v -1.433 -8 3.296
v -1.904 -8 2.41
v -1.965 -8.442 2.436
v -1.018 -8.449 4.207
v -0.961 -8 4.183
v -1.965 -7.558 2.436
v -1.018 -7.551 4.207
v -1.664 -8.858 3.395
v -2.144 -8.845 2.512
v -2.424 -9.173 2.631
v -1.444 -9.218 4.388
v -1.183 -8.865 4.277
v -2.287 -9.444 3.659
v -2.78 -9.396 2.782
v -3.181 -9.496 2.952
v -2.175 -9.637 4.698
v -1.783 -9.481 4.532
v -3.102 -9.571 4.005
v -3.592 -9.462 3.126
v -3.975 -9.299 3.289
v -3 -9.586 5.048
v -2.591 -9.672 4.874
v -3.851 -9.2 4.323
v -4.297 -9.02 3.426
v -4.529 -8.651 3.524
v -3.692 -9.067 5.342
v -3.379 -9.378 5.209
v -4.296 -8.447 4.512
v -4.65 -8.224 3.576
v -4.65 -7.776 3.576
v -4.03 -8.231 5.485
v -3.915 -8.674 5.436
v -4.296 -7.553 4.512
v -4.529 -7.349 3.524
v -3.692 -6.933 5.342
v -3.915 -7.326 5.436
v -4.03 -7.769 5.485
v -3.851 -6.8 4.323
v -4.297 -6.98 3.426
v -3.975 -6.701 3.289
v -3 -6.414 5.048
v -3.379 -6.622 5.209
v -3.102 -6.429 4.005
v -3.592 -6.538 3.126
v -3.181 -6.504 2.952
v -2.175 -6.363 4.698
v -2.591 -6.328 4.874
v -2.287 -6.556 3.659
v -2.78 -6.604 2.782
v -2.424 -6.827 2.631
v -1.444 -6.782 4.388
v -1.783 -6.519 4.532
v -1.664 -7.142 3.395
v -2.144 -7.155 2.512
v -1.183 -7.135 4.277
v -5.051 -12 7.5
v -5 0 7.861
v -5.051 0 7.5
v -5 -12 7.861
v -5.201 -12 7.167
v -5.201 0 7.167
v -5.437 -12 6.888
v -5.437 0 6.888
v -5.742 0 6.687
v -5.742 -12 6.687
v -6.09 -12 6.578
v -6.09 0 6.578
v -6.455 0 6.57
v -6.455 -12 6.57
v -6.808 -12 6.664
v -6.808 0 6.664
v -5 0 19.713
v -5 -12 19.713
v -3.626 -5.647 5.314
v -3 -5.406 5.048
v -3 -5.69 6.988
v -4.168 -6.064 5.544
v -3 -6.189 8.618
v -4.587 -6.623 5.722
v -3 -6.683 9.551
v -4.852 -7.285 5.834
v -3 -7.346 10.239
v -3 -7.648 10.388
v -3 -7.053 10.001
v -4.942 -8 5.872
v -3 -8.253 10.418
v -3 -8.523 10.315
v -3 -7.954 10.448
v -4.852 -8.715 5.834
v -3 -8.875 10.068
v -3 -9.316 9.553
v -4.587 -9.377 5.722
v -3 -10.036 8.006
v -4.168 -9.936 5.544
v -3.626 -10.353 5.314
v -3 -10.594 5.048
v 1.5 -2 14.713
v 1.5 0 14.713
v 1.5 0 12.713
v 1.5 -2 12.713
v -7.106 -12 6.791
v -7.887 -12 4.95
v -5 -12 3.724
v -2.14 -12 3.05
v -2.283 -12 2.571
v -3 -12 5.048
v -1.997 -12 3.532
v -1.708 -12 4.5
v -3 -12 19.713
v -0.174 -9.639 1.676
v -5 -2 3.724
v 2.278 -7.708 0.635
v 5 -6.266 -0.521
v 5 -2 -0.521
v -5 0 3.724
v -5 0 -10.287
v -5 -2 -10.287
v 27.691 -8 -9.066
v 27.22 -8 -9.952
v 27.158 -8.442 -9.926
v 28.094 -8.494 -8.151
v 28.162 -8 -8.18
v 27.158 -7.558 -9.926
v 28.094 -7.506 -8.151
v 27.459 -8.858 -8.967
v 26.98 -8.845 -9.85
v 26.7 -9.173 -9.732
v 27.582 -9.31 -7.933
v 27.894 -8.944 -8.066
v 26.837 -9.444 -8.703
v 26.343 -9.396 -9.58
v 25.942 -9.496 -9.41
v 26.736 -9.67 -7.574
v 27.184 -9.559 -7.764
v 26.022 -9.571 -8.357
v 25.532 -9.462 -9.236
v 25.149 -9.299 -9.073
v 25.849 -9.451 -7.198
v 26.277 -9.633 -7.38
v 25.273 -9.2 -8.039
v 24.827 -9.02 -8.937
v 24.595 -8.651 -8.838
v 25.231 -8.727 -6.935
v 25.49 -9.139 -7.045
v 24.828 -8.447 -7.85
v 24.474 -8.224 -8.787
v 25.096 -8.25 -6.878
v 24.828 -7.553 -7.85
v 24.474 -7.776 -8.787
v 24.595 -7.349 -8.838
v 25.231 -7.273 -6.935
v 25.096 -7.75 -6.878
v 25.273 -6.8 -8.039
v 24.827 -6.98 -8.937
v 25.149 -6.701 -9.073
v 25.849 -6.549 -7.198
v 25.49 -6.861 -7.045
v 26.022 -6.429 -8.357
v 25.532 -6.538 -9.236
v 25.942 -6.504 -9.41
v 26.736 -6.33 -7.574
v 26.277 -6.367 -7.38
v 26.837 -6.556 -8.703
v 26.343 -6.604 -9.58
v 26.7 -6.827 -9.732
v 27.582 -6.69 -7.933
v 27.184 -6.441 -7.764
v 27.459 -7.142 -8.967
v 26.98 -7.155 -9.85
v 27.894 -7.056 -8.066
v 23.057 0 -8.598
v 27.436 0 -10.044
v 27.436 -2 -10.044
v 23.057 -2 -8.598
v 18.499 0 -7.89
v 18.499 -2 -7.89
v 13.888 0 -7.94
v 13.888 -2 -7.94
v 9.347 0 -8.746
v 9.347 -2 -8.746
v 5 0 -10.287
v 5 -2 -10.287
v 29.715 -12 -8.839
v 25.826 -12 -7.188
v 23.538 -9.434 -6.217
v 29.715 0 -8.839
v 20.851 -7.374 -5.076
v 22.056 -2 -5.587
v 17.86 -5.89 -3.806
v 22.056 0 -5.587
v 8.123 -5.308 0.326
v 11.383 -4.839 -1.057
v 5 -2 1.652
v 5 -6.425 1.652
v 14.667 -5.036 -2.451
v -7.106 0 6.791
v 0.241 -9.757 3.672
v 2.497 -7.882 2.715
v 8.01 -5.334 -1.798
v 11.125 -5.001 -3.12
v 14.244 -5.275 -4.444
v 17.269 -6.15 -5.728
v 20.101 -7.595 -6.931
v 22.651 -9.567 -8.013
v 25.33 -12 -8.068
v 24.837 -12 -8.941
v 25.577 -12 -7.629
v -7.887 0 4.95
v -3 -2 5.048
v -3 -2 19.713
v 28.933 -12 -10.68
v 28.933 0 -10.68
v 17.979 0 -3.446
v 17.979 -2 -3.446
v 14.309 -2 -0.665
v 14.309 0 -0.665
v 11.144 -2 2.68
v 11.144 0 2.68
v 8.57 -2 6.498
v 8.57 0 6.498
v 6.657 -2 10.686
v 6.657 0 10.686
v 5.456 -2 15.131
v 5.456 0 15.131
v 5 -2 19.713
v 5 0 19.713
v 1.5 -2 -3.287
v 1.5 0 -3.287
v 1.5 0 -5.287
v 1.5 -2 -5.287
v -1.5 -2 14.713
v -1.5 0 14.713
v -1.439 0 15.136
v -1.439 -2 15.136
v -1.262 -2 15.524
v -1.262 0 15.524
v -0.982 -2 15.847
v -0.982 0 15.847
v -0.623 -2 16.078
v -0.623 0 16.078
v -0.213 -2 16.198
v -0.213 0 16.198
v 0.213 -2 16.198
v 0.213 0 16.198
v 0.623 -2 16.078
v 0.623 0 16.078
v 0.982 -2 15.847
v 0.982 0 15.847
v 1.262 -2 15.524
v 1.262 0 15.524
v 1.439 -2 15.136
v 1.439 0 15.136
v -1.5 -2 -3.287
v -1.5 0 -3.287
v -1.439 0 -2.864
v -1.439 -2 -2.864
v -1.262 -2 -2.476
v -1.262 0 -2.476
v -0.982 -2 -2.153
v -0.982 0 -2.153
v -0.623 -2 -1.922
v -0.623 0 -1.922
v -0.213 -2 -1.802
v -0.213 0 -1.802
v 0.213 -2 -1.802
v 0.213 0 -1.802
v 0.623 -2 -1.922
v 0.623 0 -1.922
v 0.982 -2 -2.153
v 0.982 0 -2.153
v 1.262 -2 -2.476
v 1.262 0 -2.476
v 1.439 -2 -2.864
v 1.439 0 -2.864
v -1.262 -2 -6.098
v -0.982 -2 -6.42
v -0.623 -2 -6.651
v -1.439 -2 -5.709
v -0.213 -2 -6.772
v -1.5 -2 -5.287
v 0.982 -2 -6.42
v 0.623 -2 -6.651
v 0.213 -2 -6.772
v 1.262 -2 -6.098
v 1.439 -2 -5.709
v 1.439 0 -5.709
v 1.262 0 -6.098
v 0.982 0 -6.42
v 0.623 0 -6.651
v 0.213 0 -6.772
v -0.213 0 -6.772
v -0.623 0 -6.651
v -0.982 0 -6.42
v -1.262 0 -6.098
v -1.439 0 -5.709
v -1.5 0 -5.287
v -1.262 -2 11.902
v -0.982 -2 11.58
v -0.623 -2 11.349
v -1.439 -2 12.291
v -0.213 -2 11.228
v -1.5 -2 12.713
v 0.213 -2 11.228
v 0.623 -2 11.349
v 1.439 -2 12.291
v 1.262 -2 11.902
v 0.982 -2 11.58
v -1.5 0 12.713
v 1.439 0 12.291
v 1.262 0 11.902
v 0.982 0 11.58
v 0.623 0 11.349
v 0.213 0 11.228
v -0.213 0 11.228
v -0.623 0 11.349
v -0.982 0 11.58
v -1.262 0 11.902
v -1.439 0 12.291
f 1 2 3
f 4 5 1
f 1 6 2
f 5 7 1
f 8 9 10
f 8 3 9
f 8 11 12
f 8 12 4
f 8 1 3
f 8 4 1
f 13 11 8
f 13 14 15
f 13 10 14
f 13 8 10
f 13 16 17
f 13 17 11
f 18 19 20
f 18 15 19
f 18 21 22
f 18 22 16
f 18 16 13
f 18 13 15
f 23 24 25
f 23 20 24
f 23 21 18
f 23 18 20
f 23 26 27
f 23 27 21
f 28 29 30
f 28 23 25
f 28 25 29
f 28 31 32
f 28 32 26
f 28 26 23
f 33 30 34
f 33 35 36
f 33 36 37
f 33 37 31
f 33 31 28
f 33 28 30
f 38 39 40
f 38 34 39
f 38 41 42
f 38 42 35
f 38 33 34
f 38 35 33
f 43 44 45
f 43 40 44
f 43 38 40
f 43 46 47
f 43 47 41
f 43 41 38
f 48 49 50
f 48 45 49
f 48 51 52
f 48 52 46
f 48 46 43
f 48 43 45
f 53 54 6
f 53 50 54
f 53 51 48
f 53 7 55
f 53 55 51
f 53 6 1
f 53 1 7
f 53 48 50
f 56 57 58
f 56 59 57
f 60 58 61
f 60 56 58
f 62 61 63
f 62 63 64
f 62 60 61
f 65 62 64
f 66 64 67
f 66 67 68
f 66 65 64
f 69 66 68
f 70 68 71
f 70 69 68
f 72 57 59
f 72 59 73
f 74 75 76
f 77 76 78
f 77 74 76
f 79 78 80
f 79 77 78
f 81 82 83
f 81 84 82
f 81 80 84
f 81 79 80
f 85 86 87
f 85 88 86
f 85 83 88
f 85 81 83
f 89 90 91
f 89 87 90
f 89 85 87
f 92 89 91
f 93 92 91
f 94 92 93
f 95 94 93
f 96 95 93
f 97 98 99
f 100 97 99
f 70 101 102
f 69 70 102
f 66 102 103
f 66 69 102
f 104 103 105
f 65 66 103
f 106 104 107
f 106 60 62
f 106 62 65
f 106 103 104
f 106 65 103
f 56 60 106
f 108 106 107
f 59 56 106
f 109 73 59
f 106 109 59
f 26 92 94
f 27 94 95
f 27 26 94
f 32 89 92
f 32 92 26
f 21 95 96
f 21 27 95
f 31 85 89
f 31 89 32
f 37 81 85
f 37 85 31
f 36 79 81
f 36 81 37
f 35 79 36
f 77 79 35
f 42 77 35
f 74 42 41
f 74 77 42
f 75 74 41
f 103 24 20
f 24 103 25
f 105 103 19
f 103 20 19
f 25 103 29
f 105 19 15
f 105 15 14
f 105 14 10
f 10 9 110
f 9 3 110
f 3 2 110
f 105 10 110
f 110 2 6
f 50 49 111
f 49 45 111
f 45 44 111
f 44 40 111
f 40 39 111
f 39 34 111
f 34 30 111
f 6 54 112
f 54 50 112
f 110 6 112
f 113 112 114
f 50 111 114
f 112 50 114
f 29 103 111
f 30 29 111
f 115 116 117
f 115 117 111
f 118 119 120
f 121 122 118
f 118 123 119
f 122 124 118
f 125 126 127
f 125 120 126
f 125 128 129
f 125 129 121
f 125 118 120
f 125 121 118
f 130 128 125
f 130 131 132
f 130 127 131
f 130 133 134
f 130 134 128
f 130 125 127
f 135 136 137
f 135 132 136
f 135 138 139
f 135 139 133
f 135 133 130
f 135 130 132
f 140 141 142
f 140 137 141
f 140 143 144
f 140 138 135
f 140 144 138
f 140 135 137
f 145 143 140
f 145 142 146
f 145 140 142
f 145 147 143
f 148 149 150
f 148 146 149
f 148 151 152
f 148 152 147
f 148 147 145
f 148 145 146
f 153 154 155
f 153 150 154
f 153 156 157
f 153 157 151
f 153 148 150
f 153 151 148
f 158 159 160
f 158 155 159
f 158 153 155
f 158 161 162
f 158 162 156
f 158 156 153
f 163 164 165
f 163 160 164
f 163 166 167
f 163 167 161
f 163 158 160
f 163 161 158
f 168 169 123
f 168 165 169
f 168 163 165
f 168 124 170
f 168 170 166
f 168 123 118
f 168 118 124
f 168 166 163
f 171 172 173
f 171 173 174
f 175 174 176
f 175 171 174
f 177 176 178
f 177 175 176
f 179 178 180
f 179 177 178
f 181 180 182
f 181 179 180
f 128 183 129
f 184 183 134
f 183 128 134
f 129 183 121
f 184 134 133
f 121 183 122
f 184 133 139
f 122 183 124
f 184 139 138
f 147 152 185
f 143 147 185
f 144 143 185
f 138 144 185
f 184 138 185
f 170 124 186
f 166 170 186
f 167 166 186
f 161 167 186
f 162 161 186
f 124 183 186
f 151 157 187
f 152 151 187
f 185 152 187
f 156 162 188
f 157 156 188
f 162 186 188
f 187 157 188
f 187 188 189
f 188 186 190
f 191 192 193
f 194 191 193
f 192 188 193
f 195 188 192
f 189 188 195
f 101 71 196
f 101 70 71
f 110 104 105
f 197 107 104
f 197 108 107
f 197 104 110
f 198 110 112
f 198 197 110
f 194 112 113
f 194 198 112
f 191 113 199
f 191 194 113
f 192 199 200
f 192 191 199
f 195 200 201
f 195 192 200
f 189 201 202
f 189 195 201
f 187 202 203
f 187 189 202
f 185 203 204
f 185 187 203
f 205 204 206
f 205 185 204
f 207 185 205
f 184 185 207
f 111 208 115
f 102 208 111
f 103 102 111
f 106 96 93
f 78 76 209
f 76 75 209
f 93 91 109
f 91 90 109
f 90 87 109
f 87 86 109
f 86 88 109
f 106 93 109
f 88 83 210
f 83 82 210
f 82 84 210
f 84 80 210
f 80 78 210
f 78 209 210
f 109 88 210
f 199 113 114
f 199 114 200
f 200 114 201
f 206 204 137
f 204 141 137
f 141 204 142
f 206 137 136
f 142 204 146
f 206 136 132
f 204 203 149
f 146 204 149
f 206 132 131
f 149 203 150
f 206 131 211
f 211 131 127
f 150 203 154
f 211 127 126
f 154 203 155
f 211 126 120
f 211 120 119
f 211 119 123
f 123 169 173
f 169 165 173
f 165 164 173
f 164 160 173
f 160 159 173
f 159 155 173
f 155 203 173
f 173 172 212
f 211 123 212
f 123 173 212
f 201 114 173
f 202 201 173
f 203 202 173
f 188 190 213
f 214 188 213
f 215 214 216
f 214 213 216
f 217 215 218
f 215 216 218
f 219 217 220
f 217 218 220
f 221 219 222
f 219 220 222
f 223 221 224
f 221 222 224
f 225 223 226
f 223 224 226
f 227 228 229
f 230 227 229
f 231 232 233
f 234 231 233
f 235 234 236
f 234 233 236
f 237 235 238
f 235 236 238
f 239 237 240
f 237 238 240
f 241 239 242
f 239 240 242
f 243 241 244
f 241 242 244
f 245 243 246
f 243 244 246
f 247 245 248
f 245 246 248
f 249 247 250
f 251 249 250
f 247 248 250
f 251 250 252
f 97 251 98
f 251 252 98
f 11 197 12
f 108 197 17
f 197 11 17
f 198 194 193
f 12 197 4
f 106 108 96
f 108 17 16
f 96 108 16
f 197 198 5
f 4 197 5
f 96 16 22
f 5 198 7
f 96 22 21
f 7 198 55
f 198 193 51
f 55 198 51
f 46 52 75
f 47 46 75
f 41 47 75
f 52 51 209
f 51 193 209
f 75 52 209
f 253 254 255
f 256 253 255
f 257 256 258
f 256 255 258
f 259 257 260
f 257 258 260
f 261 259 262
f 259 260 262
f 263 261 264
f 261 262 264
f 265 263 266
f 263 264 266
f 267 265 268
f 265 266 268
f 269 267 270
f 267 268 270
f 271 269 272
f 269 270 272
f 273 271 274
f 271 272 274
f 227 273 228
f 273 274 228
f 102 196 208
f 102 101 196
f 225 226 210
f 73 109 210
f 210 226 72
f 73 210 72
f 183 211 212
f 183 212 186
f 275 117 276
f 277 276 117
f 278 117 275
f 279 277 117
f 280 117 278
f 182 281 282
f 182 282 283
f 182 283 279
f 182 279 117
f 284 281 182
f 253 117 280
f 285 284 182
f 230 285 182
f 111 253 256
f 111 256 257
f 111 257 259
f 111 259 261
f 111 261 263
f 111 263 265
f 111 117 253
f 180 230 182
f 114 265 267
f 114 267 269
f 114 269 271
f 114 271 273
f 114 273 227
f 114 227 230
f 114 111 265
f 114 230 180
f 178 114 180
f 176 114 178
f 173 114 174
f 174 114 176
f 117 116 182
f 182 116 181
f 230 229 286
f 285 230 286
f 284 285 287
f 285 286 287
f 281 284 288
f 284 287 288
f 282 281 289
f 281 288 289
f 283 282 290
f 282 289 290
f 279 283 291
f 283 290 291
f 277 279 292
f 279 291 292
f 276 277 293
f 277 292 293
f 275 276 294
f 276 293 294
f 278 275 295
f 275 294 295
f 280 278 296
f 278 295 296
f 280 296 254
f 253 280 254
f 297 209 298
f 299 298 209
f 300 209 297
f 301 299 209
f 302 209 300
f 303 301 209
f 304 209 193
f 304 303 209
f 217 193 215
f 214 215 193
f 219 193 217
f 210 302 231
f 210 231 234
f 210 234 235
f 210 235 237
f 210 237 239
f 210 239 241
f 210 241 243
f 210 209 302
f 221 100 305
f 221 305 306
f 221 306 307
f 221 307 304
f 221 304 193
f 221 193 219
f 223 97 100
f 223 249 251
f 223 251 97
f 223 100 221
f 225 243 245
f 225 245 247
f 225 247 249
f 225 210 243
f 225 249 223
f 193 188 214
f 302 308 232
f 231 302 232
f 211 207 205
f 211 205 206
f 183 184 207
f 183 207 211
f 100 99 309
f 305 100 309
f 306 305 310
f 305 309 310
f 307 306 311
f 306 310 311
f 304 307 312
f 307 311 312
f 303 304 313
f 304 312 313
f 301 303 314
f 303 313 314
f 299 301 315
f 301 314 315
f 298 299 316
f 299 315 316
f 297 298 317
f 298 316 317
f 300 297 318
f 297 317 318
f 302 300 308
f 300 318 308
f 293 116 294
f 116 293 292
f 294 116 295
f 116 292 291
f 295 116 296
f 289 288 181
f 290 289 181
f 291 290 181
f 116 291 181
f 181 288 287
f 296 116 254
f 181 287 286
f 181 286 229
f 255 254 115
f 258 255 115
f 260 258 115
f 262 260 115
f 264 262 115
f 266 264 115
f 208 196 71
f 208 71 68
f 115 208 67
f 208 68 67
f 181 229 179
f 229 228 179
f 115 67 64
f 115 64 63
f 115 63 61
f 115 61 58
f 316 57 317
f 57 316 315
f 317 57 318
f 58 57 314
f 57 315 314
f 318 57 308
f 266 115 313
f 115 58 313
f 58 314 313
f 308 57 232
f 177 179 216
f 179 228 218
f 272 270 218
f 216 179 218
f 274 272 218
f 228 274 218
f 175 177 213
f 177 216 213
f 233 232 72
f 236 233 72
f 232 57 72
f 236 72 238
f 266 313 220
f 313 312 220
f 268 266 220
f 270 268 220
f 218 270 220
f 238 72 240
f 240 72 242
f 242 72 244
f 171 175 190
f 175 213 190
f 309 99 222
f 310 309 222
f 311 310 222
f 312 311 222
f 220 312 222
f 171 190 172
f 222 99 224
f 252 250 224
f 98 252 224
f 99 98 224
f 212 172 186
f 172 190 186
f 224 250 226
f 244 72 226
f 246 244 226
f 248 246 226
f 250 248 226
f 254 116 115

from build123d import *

# Parameters (mm, degrees)
F0_W          = 10
F0_H          = 30
F1_DEPTH      = 2
F3_DEPTH      = 10
F3_DEPTH_BACK = 2
F4_R          = 1.5
F4_R_2        = 19
F5_DEPTH      = 28.2830263058
F5_TAPER      = -5
F6_R          = 2.65
F7_DEPTH      = 55
F8_T1_DEPTH   = 2


# Not quite as in the source:
# - a fillet or chamfer that OpenCascade refuses, or shapes differently, is made with other operations: its cross-section is extruded or revolved along the edge and cut away or added
# - an extrude ends at something that could not be found from the text; its depth is read off the source's solid
# - a feature names something its author has since deleted; it is built from what else it names


with BuildPart() as f1:
    # F0 (on Front) → F1 (new body)
    with BuildSketch(Plane.XZ):
        with Locations((0, 4.7131987304)):
            Rectangle(F0_W, F0_H)
        with BuildLine():
            ThreePointArc((-1.5, -3.2868012696), (0, -1.7868012696), (1.5, -3.2868012696))
            Line((1.5, -3.2868012696), (1.5, -5.2868012696))
            ThreePointArc((1.5, -5.2868012696), (0, -6.7868012696), (-1.5, -5.2868012696))
            Line((-1.5, -5.2868012696), (-1.5, -3.2868012696))
        make_face(mode=Mode.SUBTRACT)
        with BuildLine():
            ThreePointArc((-1.5, 14.7131987304), (0, 16.2131987304), (1.5, 14.7131987304))
            Line((1.5, 14.7131987304), (1.5, 12.7131987304))
            ThreePointArc((1.5, 12.7131987304), (0, 11.2131987304), (-1.5, 12.7131987304))
            Line((-1.5, 12.7131987304), (-1.5, 14.7131987304))
        make_face(mode=Mode.SUBTRACT)
    extrude(amount=F1_DEPTH)

    # F2 (on face) → F3 (join, two sides)
    with BuildSketch(Plane.XZ.offset(2)) as f3_sk:
        with BuildLine():
            Line((-7.8870679483, 4.9496821465), (-5, 3.7241945098))
            Line((-5, 3.7241945098), (-5, 7.8610010163))
            ThreePointArc((-5, 7.8610010163), (-5.5824819191, 6.7769494476), (-6.807950467, 6.6643447068))
            Line((-6.807950467, 6.6643447068), (-7.1056056914, 6.7906918534))
            Line((-7.1056056914, 6.7906918534), (-7.8870679483, 4.9496821465))
        make_face()
        Polygon((5, -0.5205536523), (28.9331261898, -10.679562993), (29.7145884467, -8.8385532861), (5, 1.6521671025), align=None)
        Polygon((-5, 3.7241945098), (5, -0.5205536523), (5, 1.6521671025), (-3, 5.0479656322), (-3, 19.7131987304), (-5, 19.7131987304), (-5, 7.8610010163), align=None)
    extrude(amount=F3_DEPTH)
    extrude(f3_sk.sketch, amount=-F3_DEPTH_BACK)

    # F4 (on face) → F5 (cut, through all)
    with BuildSketch(Plane(origin=(0.5761265937, 0, 1.3572691988), x_dir=(0.9205048535, 0, -0.3907311285), z_dir=(-0.3907311285, 0, -0.9205048535))):
        with Locations((-4.1940792167, 8)):
            Circle(F4_R)
        with Locations((27.4445048224, 8)):
            Circle(F4_R)
        with Locations((11.6252128028, 24)):
            Circle(F4_R_2)
    extrude(amount=-F5_DEPTH, taper=F5_TAPER, mode=Mode.SUBTRACT)

    # F6 (on face) → F7 (cut, through all)
    with BuildSketch(Plane(origin=(1.3575888507, 0, 3.1982789057), x_dir=(0.9205048535, 0, -0.3907311285), z_dir=(0.3907311285, 0, 0.9205048535))):
        with Locations((27.4445048224, -8)):
            Circle(F6_R)
        with Locations((-4.1940792167, -8)):
            Circle(F6_R)
    extrude(amount=F7_DEPTH, mode=Mode.SUBTRACT)

    # F8: fillet of radius 28 on 2 edges, made by hand

    # F8_s2 → F8_t1 (join)
    with BuildSketch(Plane.XZ):
        with BuildLine():
            ThreePointArc((22.0555251238, -5.5874737898), (9.7786939327, 4.5355646625), (5, 19.7131987304))
            Line((5, 19.7131987304), (5, 1.6521671025))
            Line((5, 1.6521671025), (22.0555251238, -5.5874737898))
        make_face()
        with BuildLine():
            ThreePointArc((27.43600386, -10.0440722673), (16.1926256307, -7.8198466481), (5, -10.2868012696))
            Line((5, -10.2868012696), (5, -0.5205536523))
            Line((5, -0.5205536523), (27.43600386, -10.0440722673))
        make_face()
    extrude(amount=F8_T1_DEPTH)


solid = f1.part
